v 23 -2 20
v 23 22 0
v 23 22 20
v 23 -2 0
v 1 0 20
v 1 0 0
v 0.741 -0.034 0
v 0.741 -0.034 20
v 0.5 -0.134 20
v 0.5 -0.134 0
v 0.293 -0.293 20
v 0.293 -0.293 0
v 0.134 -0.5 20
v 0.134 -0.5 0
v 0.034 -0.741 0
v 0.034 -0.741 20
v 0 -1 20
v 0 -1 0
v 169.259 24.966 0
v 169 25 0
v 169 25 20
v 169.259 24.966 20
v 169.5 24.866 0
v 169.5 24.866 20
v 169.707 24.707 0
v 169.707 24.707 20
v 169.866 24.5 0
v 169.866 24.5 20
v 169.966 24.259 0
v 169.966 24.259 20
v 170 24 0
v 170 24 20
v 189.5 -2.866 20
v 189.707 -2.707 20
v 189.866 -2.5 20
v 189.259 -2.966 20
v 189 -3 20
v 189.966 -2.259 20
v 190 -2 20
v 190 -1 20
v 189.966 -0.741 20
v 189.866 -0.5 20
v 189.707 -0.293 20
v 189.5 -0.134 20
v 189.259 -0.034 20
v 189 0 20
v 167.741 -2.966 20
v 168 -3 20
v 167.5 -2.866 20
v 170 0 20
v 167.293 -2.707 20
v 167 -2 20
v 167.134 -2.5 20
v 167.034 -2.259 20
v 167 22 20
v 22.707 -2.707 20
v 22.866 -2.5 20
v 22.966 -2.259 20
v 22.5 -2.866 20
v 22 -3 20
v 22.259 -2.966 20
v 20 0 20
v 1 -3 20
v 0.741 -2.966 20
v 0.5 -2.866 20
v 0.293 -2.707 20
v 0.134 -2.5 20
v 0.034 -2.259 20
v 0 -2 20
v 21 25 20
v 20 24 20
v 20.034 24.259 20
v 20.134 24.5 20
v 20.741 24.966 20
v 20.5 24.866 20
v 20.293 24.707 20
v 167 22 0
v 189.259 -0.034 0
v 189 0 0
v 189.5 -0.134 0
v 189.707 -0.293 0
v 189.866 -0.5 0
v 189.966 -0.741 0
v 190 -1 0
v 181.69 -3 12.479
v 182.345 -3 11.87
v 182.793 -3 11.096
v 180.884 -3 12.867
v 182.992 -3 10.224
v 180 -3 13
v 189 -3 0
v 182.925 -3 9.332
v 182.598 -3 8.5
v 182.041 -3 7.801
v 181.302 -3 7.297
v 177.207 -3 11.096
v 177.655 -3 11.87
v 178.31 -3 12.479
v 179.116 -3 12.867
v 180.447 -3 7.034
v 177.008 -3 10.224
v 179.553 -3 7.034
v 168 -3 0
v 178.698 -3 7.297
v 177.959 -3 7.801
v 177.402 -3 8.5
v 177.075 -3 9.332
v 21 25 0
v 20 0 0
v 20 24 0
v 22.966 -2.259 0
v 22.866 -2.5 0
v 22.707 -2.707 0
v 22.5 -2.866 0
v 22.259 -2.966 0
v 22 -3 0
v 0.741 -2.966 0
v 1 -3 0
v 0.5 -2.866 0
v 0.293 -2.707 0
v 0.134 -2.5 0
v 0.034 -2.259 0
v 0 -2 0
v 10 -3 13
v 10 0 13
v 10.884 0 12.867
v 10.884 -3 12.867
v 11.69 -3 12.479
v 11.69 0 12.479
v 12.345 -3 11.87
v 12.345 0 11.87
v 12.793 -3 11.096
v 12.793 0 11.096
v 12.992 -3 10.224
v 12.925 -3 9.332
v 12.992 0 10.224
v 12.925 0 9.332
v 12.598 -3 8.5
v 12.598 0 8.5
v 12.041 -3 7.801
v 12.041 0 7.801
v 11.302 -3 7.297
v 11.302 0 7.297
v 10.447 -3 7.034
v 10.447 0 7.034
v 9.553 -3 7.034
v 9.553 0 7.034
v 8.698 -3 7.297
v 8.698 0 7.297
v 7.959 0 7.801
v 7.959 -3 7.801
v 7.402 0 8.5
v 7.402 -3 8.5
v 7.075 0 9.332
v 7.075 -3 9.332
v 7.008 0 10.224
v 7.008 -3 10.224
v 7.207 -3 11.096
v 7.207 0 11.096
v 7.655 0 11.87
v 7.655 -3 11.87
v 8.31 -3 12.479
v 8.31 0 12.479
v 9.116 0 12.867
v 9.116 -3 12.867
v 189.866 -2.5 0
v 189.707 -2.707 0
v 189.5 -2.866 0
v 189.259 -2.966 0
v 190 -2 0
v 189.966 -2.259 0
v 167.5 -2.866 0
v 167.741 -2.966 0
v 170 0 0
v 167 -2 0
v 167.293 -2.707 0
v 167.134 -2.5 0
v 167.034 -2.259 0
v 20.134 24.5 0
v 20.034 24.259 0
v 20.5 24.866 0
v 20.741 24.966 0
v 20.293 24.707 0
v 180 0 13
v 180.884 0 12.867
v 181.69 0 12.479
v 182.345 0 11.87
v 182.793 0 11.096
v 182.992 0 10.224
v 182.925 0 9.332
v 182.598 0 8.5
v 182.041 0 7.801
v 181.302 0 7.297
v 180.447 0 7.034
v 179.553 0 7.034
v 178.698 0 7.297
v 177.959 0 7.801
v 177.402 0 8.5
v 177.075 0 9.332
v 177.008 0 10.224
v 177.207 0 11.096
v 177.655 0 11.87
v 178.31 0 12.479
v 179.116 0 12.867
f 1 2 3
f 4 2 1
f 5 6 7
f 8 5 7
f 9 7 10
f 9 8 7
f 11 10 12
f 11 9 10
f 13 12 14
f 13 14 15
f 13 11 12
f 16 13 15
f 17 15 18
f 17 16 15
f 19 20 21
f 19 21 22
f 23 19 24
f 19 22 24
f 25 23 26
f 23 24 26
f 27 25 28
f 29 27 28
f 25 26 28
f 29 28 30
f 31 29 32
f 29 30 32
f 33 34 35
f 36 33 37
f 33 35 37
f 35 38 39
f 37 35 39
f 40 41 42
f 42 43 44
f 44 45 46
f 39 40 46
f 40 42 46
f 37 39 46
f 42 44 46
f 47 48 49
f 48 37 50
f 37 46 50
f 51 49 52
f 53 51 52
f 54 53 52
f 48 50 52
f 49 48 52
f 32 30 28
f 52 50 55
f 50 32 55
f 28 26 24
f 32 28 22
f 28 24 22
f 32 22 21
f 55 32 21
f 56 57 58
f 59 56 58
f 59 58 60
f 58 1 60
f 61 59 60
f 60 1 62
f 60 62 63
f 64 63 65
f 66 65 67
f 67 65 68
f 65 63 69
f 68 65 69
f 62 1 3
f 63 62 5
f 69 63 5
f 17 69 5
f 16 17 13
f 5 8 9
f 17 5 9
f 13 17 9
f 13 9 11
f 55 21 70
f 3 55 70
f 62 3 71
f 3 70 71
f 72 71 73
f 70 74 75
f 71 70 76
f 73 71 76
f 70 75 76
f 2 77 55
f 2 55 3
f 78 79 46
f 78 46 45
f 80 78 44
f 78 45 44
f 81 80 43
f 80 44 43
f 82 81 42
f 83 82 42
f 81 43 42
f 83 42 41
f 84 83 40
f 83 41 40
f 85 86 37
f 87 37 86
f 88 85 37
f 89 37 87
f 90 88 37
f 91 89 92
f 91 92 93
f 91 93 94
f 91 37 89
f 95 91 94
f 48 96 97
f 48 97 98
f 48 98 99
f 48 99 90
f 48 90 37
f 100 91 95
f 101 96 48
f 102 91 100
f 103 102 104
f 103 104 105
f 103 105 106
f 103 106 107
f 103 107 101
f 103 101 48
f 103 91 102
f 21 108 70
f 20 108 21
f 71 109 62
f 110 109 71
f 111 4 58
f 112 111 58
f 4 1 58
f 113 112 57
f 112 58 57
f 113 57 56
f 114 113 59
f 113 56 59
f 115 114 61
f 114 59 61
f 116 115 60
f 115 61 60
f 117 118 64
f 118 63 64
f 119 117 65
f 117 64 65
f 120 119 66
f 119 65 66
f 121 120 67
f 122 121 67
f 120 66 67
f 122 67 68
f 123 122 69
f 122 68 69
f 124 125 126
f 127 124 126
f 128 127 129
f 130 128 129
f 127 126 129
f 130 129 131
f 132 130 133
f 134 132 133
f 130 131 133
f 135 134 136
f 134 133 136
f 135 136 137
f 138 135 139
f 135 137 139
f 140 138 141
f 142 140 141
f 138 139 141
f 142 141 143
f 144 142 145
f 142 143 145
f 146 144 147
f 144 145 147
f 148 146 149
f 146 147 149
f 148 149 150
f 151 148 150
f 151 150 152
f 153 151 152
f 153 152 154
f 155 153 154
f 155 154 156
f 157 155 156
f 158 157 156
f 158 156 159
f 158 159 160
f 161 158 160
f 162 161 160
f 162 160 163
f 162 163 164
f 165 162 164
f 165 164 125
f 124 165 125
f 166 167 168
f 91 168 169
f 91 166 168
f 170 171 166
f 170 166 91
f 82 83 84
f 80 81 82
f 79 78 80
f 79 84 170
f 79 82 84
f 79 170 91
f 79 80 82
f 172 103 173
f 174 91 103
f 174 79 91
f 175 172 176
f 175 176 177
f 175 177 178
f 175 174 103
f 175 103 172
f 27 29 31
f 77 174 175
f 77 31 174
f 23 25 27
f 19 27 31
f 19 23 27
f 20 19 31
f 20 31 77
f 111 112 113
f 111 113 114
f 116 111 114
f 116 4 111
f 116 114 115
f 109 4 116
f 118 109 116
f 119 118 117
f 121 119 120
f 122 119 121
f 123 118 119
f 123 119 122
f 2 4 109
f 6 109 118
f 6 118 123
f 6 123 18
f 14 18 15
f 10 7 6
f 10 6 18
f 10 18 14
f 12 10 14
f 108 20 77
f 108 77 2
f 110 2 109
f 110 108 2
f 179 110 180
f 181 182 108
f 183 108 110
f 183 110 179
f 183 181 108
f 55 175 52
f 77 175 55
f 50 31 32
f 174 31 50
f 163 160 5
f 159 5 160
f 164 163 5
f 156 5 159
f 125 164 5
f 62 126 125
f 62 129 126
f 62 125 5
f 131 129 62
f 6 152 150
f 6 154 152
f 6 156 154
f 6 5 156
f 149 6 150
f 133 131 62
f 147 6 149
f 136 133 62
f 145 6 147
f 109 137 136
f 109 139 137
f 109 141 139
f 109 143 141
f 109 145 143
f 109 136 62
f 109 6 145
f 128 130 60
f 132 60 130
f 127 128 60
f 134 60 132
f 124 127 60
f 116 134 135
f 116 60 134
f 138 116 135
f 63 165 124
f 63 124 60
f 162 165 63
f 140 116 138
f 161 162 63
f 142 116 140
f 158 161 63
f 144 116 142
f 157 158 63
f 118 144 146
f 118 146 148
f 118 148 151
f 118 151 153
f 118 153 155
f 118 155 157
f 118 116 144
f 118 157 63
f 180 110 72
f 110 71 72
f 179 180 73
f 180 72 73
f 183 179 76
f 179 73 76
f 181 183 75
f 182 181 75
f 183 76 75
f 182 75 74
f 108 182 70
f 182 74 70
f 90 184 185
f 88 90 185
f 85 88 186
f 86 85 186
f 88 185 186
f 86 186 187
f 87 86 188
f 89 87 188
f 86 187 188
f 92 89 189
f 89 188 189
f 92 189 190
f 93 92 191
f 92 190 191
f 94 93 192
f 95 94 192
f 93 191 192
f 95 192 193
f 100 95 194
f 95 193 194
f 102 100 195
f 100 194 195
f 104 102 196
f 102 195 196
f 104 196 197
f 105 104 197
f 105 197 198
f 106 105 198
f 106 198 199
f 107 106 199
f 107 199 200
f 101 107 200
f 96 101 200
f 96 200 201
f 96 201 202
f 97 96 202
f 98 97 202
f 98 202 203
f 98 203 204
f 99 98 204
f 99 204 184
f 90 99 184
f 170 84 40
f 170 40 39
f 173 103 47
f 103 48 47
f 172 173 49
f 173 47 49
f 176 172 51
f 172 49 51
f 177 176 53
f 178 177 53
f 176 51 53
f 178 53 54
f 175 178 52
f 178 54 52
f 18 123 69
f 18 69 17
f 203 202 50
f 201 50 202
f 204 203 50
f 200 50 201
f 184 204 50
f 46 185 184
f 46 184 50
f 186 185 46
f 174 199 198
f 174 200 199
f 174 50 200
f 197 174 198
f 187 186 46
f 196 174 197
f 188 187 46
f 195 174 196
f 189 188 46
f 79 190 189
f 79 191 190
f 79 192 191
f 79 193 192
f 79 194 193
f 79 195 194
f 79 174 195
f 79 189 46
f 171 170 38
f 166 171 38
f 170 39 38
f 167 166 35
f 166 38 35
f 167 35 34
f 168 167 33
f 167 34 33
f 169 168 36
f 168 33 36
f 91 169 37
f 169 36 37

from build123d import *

# Parameters (mm, degrees)
EXTRUDE_THIN1_DEPTH = 20
FILLET1_R           = 1
CUT_EXTRUDE1_REACH  = 194.678
SKETCH2_R           = 3


with BuildPart() as part:
    # Sketch1 → Extrude-Thin1 (new body)
    with BuildSketch(Plane.XY):
        Polygon((0, 0), (20, 0), (20, 25), (170, 25), (170, 0), (190, 0), (190, -3), (167, -3), (167, 22), (23, 22), (23, -3), (0, -3), align=None)
    extrude(amount=EXTRUDE_THIN1_DEPTH)

    # Fillet1
    fillet1_edges = [part.edges().sort_by_distance(p)[0] for p in [
        (167, -3, 10),
        (23, -3, 10),
        (0, -3, 10),
        (0, 0, 10),
        (20, 25, 10),
        (170, 25, 10),
        (190, 0, 10),
        (190, -3, 10),
    ]]
    fillet(fillet1_edges, radius=FILLET1_R)

    # Sketch2 → Cut-Extrude1 (cut, up to next)
    with BuildSketch(Plane(origin=(0, 0, 0), x_dir=(1, 0, 0), z_dir=(0, 1, 0)), mode=Mode.PRIVATE) as cut_extrude1_sk1:
        with Locations(Location((10, -10, 0), (0, 0, 270))):
            Circle(SKETCH2_R)
    cut_extrude1_tool1 = extrude(cut_extrude1_sk1.sketch, amount=-CUT_EXTRUDE1_REACH, mode=Mode.PRIVATE) & part.part
    # Sketch2 → Cut-Extrude1 (cut, up to next)
    with BuildSketch(Plane(origin=(0, 0, 0), x_dir=(1, 0, 0), z_dir=(0, 1, 0)), mode=Mode.PRIVATE) as cut_extrude1_sk2:
        with Locations(Location((180, -10, 0), (0, 0, 270))):
            Circle(SKETCH2_R)
    cut_extrude1_tool2 = extrude(cut_extrude1_sk2.sketch, amount=-CUT_EXTRUDE1_REACH, mode=Mode.PRIVATE) & part.part
    add(cut_extrude1_tool1.solids().sort_by_distance((10, 0, 10))[0], mode=Mode.SUBTRACT)
    add(cut_extrude1_tool2.solids().sort_by_distance((180, 0, 10))[0], mode=Mode.SUBTRACT)


solid = part.part
